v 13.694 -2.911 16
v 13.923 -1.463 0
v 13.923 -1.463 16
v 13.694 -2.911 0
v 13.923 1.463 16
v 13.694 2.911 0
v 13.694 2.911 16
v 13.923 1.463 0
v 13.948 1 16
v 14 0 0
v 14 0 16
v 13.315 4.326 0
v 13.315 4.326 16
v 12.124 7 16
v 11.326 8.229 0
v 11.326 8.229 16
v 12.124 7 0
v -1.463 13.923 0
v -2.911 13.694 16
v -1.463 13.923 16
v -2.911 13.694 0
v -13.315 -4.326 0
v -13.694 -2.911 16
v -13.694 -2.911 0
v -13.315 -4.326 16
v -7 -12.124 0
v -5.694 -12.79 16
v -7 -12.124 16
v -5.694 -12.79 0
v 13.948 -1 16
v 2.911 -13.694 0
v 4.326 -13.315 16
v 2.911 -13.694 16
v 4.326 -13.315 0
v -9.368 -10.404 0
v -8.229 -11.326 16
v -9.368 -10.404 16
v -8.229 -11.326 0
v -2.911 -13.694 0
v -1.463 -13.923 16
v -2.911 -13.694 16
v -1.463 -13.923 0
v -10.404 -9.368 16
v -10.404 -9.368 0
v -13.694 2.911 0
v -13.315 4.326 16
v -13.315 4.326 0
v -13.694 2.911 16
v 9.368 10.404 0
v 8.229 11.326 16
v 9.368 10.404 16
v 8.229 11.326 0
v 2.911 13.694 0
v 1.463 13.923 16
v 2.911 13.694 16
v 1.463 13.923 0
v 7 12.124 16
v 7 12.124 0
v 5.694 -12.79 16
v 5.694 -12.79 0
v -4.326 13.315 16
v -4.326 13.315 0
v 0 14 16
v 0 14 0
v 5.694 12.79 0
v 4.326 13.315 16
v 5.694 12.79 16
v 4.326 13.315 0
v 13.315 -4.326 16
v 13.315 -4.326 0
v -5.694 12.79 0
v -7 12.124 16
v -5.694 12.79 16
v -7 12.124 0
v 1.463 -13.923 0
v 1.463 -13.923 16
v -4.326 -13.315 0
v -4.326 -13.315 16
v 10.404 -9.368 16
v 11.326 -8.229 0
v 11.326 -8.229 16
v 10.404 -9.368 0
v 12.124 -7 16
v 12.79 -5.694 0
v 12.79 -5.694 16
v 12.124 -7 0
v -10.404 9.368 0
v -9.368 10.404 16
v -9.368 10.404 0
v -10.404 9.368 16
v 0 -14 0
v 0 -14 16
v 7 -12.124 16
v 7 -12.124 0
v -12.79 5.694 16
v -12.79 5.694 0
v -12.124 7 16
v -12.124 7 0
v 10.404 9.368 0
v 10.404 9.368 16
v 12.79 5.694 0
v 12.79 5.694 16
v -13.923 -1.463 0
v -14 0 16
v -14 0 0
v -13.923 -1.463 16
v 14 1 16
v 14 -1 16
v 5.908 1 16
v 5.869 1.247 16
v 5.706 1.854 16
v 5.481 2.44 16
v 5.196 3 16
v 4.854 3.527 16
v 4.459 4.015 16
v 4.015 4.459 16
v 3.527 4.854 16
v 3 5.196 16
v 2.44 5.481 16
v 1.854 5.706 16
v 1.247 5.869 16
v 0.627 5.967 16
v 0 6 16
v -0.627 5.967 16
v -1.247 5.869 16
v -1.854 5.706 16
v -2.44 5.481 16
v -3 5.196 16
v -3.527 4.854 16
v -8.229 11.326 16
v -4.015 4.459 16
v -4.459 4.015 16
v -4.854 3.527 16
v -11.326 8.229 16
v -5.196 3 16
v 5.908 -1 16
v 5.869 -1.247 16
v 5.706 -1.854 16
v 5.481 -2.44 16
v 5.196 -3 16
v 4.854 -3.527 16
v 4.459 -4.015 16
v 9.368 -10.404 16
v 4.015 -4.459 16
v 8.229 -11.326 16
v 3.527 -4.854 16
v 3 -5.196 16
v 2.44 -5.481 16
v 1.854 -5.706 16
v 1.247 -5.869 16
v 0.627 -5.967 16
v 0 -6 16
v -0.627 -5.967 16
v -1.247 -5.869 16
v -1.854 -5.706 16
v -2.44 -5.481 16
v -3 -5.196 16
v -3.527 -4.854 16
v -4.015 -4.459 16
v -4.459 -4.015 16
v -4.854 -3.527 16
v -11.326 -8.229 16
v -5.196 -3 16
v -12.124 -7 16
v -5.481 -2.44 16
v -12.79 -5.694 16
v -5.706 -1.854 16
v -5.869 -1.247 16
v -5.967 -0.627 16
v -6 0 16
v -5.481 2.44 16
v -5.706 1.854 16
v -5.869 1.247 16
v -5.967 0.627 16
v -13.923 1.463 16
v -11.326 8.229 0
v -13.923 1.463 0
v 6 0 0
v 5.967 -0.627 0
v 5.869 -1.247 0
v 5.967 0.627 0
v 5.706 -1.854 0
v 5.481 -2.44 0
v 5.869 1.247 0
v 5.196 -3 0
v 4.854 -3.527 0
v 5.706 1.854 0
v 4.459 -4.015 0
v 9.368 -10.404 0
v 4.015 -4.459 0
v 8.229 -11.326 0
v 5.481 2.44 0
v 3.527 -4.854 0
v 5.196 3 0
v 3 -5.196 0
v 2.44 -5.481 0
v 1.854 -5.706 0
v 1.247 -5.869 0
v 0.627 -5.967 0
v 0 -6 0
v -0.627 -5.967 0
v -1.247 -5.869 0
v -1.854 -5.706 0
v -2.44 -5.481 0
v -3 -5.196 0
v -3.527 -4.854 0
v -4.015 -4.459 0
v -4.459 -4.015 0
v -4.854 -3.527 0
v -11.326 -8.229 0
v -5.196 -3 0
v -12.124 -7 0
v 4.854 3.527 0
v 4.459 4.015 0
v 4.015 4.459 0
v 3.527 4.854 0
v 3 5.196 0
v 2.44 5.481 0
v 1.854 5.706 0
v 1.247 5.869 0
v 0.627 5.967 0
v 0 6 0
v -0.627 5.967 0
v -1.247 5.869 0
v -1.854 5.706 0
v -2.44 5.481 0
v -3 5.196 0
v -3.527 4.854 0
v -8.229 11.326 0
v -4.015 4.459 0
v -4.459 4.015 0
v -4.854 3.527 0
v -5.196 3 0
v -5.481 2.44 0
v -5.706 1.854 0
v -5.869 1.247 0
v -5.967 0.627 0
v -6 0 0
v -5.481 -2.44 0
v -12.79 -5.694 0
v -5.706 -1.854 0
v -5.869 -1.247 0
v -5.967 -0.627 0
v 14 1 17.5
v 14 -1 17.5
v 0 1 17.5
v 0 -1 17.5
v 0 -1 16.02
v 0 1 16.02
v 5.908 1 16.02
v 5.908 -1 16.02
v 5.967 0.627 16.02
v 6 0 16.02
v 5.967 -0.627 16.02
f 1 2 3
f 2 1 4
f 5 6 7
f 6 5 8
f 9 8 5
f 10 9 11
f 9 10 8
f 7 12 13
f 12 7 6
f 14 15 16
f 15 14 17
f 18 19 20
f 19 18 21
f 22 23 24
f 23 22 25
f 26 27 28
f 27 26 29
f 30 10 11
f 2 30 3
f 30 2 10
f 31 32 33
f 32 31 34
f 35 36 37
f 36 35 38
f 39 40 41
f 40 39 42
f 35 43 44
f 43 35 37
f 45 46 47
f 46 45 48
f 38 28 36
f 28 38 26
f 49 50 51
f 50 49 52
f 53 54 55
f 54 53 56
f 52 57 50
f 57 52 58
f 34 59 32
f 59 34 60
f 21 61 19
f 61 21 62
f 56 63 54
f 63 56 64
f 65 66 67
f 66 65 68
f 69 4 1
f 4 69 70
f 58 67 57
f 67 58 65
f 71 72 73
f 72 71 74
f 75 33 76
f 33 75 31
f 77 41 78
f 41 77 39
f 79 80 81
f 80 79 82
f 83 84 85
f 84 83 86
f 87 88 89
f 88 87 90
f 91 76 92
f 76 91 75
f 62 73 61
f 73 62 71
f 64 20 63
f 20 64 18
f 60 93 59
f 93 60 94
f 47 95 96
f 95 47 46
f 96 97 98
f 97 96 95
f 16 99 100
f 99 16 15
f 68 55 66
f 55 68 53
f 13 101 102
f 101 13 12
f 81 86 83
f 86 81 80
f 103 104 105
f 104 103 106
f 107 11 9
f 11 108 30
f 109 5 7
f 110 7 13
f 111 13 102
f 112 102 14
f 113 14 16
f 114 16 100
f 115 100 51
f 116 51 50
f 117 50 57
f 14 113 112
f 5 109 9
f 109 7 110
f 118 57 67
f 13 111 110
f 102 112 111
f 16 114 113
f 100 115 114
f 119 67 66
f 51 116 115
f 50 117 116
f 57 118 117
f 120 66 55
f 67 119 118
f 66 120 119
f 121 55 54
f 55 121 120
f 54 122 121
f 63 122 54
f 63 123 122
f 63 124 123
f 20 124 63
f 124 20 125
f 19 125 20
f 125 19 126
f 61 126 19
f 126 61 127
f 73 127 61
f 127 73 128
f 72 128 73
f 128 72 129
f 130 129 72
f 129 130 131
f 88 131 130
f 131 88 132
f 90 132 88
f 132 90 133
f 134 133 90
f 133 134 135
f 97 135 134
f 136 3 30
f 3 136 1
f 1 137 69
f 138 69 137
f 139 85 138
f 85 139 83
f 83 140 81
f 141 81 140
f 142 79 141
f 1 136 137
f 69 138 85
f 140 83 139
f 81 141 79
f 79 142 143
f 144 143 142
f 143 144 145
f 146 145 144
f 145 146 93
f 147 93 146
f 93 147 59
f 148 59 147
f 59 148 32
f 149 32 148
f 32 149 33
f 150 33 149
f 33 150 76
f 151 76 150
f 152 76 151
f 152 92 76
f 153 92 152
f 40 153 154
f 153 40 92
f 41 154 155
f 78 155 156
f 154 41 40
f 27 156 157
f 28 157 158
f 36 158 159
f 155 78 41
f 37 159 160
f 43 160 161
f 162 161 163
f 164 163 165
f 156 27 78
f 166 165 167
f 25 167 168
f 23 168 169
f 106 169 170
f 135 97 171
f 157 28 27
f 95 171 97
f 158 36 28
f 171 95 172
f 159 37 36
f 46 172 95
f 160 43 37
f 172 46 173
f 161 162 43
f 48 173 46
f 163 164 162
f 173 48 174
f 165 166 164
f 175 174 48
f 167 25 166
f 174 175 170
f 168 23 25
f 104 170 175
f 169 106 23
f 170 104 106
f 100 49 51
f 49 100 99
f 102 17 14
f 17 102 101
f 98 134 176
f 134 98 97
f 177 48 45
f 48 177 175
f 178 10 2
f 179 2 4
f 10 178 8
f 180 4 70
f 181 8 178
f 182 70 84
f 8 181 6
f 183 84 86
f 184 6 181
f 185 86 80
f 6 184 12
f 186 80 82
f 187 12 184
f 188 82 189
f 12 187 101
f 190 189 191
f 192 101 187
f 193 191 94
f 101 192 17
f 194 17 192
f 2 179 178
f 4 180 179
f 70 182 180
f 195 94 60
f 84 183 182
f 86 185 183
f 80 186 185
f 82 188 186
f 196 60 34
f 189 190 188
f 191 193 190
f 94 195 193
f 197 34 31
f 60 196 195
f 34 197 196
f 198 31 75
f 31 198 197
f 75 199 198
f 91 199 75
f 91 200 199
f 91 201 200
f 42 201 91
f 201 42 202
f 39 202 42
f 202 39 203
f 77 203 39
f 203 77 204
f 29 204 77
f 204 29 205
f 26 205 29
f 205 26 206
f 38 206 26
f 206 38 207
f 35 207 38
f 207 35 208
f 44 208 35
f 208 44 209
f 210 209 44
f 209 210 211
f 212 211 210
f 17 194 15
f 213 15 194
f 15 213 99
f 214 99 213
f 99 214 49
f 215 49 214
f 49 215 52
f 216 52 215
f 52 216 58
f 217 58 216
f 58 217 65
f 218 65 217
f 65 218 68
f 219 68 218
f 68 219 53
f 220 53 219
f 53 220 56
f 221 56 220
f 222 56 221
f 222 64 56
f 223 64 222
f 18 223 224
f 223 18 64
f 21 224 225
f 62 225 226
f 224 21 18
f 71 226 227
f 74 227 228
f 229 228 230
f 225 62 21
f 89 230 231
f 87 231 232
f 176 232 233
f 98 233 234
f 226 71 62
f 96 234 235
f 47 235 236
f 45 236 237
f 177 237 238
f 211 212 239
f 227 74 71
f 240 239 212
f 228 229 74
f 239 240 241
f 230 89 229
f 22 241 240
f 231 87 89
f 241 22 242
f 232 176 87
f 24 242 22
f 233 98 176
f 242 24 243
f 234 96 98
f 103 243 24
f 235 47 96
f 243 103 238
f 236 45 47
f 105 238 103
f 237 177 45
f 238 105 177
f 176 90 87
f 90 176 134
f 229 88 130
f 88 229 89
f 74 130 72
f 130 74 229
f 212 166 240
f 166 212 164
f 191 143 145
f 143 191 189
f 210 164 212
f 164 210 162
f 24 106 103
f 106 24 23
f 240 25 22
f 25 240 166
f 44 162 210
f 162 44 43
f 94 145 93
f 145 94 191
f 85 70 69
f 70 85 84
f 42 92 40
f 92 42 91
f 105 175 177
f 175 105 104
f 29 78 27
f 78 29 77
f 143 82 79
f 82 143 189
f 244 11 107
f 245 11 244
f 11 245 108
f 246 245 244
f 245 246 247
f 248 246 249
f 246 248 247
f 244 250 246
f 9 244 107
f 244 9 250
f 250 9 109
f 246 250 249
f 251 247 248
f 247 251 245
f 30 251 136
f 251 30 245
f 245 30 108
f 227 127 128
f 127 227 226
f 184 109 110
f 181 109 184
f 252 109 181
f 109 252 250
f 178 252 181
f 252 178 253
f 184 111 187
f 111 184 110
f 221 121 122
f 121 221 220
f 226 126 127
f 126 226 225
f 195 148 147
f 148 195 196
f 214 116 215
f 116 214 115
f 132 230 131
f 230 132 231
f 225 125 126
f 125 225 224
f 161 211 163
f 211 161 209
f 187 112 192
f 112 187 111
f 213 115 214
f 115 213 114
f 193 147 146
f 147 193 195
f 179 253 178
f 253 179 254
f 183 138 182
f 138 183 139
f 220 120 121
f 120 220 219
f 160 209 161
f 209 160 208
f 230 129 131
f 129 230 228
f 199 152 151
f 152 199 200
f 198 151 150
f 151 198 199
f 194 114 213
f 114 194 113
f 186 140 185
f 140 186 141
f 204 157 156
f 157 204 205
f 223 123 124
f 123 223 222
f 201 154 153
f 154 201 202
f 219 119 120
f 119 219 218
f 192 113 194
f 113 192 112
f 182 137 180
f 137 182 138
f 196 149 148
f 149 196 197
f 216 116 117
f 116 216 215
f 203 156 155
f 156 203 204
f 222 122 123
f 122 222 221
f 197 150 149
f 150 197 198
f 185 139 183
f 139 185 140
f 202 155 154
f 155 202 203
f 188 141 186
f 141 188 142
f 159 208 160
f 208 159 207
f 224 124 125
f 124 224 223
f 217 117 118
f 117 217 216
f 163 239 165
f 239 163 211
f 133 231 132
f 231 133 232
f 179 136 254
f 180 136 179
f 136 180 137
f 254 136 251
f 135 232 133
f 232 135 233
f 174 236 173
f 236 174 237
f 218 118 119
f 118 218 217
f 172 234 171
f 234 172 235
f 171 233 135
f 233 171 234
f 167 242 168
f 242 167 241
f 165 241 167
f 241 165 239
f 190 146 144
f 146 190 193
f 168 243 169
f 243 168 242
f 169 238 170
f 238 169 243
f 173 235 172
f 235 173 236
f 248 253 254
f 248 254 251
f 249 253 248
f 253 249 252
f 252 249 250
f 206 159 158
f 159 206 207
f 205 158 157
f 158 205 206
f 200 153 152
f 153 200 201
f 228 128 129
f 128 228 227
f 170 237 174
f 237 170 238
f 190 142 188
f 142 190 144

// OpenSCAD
// Pointer control knob.
$fn = 60;
eps = 0.02;
bore_d = 12;
knob_d = 28;
knob_h = 16;
difference() { union() { cylinder(d=knob_d,h=knob_h); translate([0,-1,knob_h]) cube([knob_d/2,2,1.5]); } translate([0,0,-eps]) cylinder(d=bore_d,h=knob_h+2*eps); }
